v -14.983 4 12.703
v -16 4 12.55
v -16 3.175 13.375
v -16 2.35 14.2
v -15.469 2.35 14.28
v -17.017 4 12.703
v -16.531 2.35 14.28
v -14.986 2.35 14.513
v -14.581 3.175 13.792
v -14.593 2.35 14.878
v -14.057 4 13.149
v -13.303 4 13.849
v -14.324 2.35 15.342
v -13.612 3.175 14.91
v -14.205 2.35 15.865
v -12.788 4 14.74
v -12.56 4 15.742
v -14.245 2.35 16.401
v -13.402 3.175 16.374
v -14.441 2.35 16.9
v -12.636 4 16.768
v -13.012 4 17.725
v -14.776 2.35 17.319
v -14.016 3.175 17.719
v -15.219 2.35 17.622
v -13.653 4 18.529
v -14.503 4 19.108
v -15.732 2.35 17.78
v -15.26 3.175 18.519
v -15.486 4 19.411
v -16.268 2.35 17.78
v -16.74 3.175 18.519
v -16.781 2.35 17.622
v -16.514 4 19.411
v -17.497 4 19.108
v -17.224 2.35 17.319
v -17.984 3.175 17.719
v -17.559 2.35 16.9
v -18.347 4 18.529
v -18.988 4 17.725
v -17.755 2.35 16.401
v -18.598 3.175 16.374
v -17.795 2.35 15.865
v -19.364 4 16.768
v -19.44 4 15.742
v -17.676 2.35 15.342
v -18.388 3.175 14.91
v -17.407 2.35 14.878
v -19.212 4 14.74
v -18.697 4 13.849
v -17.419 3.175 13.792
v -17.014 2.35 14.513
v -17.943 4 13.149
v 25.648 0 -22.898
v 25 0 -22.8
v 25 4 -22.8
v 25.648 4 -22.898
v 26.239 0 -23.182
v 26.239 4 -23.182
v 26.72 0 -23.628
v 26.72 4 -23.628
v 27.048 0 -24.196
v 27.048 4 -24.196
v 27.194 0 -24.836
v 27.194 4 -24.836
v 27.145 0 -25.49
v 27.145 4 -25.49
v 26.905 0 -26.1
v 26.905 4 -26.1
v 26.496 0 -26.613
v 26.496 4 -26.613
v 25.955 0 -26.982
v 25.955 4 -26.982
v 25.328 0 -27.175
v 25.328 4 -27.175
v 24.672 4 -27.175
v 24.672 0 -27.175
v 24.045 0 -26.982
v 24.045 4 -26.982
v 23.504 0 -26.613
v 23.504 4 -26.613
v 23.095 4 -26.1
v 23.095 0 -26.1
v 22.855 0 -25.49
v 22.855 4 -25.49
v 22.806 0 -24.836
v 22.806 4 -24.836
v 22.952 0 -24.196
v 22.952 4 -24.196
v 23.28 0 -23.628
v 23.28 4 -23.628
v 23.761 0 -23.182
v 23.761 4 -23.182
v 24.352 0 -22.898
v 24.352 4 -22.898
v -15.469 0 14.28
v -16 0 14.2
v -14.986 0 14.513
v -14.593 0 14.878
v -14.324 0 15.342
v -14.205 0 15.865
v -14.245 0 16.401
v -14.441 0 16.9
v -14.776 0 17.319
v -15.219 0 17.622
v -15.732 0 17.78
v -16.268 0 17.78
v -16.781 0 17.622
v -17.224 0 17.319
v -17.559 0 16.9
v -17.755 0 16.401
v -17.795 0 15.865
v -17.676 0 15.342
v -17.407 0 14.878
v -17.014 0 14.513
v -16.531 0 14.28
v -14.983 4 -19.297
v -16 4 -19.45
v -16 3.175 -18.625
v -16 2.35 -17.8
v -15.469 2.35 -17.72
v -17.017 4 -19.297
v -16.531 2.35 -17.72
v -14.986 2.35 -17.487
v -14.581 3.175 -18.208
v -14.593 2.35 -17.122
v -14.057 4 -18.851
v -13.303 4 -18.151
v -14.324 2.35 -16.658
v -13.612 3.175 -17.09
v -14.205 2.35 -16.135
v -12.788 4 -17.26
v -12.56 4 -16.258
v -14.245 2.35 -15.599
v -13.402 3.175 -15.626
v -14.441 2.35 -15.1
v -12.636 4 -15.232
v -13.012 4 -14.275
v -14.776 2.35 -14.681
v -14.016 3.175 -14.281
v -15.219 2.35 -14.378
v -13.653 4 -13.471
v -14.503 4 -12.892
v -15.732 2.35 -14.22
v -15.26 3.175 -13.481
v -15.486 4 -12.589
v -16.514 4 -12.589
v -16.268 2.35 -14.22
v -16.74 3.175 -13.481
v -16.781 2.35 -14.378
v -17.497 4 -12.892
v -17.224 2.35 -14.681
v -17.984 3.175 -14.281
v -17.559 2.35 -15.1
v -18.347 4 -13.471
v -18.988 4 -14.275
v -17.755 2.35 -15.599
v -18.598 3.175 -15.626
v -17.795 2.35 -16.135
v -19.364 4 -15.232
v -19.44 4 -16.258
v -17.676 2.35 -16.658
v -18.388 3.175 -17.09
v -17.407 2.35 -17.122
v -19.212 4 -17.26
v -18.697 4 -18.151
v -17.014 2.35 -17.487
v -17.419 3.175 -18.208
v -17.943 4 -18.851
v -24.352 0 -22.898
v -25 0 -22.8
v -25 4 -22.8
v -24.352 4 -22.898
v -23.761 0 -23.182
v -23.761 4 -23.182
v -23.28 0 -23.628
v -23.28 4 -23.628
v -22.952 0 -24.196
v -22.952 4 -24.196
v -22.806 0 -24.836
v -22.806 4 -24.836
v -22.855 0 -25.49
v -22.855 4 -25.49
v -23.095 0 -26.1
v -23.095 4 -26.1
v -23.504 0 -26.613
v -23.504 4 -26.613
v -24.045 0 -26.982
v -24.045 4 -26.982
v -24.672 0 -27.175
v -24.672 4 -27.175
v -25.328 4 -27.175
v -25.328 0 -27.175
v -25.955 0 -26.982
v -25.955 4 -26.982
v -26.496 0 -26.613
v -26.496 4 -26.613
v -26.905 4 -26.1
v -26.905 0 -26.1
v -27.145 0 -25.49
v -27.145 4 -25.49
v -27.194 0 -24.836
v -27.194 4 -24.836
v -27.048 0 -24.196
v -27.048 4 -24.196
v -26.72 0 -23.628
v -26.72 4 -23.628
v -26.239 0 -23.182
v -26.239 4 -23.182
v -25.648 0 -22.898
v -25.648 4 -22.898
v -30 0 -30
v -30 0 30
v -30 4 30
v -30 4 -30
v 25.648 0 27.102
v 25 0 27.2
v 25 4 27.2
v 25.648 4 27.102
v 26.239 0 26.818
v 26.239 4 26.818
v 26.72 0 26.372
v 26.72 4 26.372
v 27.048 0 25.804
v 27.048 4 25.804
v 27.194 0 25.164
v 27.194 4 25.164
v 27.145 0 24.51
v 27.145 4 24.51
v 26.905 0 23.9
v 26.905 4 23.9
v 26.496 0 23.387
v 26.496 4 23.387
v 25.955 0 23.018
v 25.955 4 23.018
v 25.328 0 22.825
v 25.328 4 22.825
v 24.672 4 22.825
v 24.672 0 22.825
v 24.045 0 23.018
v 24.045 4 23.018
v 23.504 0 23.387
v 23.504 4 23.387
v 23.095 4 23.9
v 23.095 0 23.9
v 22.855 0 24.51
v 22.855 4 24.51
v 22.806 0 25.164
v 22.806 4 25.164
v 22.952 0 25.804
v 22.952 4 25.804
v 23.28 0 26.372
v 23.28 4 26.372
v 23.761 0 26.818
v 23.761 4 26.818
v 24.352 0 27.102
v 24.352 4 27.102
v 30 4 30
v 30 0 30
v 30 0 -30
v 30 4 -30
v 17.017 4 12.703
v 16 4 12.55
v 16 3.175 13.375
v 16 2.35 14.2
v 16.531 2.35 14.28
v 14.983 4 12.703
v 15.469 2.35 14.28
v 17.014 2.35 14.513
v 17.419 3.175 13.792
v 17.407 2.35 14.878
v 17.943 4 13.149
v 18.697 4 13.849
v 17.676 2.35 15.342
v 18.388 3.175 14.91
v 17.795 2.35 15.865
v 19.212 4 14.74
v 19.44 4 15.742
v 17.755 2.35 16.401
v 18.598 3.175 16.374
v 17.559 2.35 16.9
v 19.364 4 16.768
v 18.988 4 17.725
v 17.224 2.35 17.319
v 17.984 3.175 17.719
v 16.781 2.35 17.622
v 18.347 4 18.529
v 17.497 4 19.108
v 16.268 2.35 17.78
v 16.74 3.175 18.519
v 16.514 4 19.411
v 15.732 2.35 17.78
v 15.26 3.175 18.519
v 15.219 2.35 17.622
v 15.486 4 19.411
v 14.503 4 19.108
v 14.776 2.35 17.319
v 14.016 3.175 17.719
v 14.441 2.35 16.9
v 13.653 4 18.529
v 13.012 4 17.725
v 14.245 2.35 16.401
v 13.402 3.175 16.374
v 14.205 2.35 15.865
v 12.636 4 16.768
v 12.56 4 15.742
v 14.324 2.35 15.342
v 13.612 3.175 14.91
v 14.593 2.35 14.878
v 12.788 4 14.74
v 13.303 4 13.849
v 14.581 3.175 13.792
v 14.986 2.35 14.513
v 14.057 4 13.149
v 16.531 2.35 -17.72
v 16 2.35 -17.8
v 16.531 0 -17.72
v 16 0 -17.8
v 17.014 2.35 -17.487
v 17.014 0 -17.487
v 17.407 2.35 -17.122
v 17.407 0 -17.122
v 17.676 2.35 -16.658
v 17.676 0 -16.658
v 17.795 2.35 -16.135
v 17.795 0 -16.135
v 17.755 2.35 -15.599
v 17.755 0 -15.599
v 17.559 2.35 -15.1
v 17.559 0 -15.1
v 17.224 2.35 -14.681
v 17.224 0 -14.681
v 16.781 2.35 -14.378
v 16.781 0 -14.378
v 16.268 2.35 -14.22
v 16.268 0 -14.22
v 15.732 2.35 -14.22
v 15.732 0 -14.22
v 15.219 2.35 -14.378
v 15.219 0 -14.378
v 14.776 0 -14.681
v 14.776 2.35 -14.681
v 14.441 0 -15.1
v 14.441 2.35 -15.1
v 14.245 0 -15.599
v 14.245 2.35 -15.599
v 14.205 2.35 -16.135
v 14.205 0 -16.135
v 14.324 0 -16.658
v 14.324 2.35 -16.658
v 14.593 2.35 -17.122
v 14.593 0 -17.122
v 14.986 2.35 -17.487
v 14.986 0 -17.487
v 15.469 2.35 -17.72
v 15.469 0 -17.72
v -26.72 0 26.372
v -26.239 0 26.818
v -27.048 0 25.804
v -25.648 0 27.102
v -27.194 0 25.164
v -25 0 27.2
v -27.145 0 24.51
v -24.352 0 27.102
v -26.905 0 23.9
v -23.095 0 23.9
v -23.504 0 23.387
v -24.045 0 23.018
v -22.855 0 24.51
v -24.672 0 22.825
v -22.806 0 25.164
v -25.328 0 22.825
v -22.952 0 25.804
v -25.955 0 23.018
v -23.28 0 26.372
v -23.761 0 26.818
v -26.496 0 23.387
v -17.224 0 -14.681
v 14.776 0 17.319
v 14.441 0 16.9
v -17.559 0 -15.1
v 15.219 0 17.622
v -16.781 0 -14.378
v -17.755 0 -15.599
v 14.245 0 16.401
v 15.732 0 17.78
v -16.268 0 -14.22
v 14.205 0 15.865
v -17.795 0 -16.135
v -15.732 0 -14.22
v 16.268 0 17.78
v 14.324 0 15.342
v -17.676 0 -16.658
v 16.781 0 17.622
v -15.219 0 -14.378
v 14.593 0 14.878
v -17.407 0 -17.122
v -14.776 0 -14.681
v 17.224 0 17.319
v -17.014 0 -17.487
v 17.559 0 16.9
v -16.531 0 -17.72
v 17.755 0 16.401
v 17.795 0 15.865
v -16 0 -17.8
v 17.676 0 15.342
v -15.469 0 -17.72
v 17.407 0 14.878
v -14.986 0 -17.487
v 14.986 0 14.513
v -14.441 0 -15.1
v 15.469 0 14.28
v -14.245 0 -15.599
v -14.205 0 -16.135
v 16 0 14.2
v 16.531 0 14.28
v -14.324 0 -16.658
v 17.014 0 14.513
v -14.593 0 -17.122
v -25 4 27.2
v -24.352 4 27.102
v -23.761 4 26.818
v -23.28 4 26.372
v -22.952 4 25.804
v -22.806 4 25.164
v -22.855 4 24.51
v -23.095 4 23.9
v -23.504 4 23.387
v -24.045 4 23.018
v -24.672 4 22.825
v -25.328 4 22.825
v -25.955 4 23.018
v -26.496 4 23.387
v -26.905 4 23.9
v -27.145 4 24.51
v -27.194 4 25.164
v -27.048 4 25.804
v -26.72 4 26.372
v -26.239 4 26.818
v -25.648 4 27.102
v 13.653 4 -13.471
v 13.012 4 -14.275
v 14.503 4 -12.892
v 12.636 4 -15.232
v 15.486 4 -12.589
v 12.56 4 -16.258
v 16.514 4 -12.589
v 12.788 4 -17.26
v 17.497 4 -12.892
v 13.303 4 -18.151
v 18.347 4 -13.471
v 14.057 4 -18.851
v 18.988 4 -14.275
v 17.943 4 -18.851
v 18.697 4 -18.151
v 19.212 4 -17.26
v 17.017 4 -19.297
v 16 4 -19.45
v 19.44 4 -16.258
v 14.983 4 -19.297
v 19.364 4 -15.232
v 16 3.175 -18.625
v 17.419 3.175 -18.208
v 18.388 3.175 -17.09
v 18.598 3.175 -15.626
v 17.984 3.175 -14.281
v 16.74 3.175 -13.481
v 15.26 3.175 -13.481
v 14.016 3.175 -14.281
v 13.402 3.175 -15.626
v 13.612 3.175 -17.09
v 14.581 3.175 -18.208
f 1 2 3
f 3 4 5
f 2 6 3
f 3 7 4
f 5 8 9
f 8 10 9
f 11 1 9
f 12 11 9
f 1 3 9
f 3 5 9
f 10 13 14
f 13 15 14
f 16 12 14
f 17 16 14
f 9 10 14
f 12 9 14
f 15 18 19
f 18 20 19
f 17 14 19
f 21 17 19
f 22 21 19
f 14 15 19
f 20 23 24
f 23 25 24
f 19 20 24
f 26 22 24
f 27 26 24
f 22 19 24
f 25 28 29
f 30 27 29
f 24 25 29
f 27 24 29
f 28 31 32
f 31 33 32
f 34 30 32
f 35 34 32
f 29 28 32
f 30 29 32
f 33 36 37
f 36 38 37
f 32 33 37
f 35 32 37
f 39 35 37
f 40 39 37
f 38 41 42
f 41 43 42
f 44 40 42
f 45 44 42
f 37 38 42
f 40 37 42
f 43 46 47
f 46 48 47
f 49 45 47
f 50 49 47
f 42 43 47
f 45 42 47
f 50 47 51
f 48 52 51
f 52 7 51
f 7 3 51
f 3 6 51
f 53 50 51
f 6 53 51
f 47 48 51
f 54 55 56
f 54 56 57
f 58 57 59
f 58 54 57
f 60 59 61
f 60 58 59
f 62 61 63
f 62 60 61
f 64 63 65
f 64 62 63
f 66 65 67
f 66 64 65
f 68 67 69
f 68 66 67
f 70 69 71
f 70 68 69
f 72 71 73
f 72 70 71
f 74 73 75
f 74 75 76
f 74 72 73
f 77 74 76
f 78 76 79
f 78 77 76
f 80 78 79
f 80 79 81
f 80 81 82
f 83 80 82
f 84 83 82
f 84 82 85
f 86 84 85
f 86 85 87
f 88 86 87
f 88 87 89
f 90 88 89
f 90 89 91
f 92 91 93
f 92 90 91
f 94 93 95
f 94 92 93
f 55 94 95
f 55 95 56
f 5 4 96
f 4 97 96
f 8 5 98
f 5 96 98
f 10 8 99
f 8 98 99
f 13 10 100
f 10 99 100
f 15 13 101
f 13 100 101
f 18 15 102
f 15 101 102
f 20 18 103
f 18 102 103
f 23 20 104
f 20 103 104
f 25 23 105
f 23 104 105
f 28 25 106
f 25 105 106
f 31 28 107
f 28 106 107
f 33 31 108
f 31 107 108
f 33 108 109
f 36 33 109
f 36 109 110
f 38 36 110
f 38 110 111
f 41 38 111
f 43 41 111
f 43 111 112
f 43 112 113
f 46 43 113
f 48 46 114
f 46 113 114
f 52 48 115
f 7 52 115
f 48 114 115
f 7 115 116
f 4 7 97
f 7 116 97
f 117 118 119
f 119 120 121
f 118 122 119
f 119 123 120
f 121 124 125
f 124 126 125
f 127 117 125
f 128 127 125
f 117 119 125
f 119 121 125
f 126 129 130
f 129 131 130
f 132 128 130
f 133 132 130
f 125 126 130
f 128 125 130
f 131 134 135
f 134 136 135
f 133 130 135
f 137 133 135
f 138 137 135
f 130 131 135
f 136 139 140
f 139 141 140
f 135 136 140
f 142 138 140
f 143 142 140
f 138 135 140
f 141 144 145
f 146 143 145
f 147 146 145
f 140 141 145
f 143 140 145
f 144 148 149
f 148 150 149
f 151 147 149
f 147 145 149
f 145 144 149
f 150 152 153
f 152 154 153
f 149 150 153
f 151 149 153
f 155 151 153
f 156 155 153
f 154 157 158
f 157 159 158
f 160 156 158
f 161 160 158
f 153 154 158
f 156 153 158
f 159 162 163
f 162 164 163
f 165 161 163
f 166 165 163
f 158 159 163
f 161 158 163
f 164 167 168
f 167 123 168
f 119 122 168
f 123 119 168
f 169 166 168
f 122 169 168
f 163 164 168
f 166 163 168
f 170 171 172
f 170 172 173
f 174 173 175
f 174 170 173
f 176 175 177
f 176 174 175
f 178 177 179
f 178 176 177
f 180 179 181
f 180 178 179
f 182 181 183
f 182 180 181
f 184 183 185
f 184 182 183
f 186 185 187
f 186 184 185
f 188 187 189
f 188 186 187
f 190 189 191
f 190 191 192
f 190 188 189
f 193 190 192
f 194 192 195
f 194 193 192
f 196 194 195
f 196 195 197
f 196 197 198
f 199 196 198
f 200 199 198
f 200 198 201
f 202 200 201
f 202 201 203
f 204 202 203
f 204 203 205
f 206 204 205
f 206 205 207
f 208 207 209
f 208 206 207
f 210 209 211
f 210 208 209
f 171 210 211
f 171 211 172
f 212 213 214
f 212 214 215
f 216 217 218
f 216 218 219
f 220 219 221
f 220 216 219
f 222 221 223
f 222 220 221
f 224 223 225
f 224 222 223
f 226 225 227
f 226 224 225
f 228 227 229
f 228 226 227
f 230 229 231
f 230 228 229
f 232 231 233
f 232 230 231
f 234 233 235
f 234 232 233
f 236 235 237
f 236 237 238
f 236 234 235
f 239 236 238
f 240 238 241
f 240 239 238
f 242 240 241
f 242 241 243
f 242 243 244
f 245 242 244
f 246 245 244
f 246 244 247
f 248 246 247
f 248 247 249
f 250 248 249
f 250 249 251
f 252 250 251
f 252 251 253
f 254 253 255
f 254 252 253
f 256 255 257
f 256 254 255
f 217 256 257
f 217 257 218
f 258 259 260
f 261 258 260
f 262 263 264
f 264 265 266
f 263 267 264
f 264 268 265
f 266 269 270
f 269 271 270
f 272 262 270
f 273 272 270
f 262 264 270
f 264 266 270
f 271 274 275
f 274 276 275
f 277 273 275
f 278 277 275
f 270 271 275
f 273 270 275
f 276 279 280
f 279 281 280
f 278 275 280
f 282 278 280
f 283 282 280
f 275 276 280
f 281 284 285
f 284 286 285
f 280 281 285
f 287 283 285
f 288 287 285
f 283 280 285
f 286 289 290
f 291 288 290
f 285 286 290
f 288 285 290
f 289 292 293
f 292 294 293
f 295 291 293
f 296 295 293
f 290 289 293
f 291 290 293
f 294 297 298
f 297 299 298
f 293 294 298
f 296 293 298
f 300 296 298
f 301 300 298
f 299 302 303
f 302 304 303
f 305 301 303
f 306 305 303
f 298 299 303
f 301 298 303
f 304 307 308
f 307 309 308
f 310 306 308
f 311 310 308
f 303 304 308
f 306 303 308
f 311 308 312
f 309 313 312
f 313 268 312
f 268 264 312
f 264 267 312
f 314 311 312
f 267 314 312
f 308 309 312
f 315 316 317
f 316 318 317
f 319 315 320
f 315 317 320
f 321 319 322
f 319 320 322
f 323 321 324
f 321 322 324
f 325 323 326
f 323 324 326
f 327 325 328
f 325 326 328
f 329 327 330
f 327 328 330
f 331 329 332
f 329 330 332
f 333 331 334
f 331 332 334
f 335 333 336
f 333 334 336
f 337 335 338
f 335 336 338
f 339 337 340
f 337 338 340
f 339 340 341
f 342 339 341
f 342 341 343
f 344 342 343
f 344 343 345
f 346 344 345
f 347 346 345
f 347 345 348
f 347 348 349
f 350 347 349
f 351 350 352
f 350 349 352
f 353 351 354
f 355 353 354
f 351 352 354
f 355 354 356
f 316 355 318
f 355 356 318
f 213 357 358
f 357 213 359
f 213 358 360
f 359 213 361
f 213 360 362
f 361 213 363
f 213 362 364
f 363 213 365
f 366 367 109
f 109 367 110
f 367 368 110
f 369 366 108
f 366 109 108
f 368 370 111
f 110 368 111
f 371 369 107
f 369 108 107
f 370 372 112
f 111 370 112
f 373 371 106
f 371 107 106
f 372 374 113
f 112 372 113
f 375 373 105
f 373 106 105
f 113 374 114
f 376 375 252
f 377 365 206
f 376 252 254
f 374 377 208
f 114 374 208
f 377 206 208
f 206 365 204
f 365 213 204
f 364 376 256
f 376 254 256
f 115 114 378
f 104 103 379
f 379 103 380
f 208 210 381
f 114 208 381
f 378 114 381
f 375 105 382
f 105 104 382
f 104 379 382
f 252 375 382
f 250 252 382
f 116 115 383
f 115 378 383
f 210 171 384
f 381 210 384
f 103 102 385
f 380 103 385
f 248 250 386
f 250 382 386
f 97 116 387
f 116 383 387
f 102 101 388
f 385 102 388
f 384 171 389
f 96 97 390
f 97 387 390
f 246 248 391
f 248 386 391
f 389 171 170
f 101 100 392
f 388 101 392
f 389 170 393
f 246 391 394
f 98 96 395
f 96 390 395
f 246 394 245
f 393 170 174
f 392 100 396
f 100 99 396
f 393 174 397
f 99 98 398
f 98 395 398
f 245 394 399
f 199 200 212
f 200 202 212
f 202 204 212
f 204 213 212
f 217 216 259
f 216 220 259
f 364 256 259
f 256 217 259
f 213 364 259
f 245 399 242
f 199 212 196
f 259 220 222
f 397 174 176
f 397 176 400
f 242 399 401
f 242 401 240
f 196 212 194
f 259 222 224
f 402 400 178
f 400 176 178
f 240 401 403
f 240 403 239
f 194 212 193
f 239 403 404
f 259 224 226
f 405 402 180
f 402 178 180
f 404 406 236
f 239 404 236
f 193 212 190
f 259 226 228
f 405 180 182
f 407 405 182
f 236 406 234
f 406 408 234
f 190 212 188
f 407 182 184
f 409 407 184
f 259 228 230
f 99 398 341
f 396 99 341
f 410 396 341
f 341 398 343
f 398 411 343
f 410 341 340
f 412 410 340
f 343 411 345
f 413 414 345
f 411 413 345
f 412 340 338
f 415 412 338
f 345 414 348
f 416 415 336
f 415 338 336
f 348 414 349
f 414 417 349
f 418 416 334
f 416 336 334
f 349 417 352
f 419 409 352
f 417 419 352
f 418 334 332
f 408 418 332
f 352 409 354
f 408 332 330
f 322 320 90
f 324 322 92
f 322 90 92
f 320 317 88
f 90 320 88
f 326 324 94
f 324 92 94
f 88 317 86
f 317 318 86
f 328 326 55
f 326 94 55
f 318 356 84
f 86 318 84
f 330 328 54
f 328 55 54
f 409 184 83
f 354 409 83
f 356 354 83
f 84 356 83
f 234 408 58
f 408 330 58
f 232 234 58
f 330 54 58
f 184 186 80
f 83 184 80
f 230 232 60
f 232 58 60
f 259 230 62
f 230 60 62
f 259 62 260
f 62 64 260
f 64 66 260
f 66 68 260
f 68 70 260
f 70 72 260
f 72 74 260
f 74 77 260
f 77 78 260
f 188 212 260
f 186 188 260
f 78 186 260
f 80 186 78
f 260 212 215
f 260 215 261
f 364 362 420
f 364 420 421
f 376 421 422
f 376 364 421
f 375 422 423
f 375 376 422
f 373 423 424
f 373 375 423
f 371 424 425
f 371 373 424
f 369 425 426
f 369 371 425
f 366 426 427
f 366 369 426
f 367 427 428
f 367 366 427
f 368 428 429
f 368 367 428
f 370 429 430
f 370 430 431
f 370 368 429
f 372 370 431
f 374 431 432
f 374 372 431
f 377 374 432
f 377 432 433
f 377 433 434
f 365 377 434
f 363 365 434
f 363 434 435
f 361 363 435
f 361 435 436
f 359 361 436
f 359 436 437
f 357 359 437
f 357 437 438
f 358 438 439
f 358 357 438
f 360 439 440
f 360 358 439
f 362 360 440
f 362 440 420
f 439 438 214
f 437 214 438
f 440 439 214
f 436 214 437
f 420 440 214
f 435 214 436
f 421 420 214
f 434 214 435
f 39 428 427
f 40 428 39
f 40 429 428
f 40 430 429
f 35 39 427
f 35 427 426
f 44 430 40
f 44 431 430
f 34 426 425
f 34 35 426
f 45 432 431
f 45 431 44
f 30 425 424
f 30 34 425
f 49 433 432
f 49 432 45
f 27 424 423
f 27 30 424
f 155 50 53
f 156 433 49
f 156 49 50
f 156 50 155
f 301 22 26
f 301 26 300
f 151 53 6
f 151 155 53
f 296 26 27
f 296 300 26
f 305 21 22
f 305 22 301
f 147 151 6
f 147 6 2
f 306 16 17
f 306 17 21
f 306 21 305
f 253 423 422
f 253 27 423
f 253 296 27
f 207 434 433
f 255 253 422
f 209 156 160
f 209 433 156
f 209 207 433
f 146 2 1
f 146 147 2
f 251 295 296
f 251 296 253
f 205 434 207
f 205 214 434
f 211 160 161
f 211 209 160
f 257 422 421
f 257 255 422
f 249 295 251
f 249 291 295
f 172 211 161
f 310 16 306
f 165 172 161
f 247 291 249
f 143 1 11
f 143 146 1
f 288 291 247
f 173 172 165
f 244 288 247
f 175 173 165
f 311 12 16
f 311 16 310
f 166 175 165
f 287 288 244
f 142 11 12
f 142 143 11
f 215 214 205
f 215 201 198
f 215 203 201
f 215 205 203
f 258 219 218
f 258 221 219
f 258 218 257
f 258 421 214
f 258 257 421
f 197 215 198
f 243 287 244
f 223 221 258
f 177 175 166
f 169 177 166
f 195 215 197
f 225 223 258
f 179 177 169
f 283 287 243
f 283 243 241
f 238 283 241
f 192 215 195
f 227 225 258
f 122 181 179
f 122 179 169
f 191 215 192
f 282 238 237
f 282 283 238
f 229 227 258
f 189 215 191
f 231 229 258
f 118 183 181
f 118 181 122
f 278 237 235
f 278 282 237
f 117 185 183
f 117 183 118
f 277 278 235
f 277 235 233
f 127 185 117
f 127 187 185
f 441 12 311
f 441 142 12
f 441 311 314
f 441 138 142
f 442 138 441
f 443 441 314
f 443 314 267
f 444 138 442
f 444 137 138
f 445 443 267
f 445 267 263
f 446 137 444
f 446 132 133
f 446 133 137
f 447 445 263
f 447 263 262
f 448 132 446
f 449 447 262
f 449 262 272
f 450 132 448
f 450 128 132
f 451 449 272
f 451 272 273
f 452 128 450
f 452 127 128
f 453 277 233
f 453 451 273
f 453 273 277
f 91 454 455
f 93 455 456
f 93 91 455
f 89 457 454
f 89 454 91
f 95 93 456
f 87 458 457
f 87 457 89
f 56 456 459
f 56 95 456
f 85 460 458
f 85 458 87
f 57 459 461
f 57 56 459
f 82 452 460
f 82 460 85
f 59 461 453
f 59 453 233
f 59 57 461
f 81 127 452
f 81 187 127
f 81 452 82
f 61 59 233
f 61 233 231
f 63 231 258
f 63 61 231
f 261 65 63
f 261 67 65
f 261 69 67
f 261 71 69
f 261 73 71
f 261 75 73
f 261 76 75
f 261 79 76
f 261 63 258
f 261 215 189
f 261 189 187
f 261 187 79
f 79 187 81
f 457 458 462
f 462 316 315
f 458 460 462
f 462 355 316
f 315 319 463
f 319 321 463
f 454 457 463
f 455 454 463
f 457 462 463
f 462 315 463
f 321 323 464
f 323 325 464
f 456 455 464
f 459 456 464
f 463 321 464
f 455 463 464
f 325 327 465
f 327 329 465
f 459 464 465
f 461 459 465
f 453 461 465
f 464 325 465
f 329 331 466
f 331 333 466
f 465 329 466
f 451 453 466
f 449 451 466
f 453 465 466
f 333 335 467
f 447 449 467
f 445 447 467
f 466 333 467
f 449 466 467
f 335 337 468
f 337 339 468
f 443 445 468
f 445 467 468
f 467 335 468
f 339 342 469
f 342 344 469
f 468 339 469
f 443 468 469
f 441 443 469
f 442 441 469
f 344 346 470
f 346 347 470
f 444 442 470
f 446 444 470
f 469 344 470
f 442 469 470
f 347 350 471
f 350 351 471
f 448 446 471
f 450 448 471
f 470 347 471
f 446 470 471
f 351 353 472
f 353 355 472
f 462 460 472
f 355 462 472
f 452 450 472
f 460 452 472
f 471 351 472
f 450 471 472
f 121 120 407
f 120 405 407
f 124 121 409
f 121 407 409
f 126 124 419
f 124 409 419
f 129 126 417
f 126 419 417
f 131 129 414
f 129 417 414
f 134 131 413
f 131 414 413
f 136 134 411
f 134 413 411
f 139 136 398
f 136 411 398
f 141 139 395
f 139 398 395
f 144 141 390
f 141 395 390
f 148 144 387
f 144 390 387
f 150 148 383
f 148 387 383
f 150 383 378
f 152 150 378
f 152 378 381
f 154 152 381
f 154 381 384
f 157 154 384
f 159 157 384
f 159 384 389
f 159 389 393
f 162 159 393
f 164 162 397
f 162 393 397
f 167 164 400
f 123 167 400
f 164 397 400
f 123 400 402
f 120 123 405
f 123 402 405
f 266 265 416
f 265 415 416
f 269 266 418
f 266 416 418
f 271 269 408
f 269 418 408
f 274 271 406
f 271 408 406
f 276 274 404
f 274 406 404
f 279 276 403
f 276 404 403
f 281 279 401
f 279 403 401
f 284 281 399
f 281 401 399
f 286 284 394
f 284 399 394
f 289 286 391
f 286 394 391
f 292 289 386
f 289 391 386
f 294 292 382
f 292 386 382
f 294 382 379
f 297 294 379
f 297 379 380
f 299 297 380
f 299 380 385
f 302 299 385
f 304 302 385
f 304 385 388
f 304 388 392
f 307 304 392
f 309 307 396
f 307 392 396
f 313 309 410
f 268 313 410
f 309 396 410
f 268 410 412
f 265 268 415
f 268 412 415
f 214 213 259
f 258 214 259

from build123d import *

# Parameters (mm, degrees)
SKETCH1_W                                       = 60
SKETCH1_H                                       = 60
SKETCH1_R                                       = 2.2
SKETCH1_R_2                                     = 1.65
BOSS_EXTRUDE1_DEPTH                             = 4
CSK_FOR_M3_FLAT_HEAD_MACHINE_SCREW1_D           = 3.6
CSK_FOR_M3_FLAT_HEAD_MACHINE_SCREW1_CSINK_D     = 6.9
CSK_FOR_M3_FLAT_HEAD_MACHINE_SCREW1_CSINK_ANGLE = 90


with BuildPart() as part:
    # Sketch1 → Boss-Extrude1 (new body)
    with BuildSketch(Plane(origin=(0, 0, 0), x_dir=(1, 0, 0), z_dir=(0, 1, 0))):
        Rectangle(SKETCH1_W, SKETCH1_H)
        with Locations(Location((-25, 25, 0), (0, 0, 270))):
            Circle(SKETCH1_R, mode=Mode.SUBTRACT)
        with Locations(Location((-16, 16, 0), (0, 0, 270))):
            Circle(SKETCH1_R_2, mode=Mode.SUBTRACT)
        with Locations(Location((-25, -25, 0), (0, 0, 270))):
            Circle(SKETCH1_R, mode=Mode.SUBTRACT)
        with Locations(Location((-16, -16, 0), (0, 0, 270))):
            Circle(SKETCH1_R_2, mode=Mode.SUBTRACT)
        with Locations(Location((25, -25, 0), (0, 0, 270))):
            Circle(SKETCH1_R, mode=Mode.SUBTRACT)
        with Locations(Location((16, -16, 0), (0, 0, 270))):
            Circle(SKETCH1_R_2, mode=Mode.SUBTRACT)
        with Locations(Location((25, 25, 0), (0, 0, 270))):
            Circle(SKETCH1_R, mode=Mode.SUBTRACT)
        with Locations(Location((16, 16, 0), (0, 0, 270))):
            Circle(SKETCH1_R_2, mode=Mode.SUBTRACT)
    extrude(amount=BOSS_EXTRUDE1_DEPTH)

    # CSK for M3 Flat Head Machine Screw1 (through all)
    with Locations(Plane(origin=(16, 4, -16), x_dir=(0, 0, 1), z_dir=(0, 1, 0))):
        with Locations((0, 0), (32, 0), (32, -32), (0, -32)):
            CounterSinkHole(CSK_FOR_M3_FLAT_HEAD_MACHINE_SCREW1_D / 2, CSK_FOR_M3_FLAT_HEAD_MACHINE_SCREW1_CSINK_D / 2, counter_sink_angle=CSK_FOR_M3_FLAT_HEAD_MACHINE_SCREW1_CSINK_ANGLE)


solid = part.part
